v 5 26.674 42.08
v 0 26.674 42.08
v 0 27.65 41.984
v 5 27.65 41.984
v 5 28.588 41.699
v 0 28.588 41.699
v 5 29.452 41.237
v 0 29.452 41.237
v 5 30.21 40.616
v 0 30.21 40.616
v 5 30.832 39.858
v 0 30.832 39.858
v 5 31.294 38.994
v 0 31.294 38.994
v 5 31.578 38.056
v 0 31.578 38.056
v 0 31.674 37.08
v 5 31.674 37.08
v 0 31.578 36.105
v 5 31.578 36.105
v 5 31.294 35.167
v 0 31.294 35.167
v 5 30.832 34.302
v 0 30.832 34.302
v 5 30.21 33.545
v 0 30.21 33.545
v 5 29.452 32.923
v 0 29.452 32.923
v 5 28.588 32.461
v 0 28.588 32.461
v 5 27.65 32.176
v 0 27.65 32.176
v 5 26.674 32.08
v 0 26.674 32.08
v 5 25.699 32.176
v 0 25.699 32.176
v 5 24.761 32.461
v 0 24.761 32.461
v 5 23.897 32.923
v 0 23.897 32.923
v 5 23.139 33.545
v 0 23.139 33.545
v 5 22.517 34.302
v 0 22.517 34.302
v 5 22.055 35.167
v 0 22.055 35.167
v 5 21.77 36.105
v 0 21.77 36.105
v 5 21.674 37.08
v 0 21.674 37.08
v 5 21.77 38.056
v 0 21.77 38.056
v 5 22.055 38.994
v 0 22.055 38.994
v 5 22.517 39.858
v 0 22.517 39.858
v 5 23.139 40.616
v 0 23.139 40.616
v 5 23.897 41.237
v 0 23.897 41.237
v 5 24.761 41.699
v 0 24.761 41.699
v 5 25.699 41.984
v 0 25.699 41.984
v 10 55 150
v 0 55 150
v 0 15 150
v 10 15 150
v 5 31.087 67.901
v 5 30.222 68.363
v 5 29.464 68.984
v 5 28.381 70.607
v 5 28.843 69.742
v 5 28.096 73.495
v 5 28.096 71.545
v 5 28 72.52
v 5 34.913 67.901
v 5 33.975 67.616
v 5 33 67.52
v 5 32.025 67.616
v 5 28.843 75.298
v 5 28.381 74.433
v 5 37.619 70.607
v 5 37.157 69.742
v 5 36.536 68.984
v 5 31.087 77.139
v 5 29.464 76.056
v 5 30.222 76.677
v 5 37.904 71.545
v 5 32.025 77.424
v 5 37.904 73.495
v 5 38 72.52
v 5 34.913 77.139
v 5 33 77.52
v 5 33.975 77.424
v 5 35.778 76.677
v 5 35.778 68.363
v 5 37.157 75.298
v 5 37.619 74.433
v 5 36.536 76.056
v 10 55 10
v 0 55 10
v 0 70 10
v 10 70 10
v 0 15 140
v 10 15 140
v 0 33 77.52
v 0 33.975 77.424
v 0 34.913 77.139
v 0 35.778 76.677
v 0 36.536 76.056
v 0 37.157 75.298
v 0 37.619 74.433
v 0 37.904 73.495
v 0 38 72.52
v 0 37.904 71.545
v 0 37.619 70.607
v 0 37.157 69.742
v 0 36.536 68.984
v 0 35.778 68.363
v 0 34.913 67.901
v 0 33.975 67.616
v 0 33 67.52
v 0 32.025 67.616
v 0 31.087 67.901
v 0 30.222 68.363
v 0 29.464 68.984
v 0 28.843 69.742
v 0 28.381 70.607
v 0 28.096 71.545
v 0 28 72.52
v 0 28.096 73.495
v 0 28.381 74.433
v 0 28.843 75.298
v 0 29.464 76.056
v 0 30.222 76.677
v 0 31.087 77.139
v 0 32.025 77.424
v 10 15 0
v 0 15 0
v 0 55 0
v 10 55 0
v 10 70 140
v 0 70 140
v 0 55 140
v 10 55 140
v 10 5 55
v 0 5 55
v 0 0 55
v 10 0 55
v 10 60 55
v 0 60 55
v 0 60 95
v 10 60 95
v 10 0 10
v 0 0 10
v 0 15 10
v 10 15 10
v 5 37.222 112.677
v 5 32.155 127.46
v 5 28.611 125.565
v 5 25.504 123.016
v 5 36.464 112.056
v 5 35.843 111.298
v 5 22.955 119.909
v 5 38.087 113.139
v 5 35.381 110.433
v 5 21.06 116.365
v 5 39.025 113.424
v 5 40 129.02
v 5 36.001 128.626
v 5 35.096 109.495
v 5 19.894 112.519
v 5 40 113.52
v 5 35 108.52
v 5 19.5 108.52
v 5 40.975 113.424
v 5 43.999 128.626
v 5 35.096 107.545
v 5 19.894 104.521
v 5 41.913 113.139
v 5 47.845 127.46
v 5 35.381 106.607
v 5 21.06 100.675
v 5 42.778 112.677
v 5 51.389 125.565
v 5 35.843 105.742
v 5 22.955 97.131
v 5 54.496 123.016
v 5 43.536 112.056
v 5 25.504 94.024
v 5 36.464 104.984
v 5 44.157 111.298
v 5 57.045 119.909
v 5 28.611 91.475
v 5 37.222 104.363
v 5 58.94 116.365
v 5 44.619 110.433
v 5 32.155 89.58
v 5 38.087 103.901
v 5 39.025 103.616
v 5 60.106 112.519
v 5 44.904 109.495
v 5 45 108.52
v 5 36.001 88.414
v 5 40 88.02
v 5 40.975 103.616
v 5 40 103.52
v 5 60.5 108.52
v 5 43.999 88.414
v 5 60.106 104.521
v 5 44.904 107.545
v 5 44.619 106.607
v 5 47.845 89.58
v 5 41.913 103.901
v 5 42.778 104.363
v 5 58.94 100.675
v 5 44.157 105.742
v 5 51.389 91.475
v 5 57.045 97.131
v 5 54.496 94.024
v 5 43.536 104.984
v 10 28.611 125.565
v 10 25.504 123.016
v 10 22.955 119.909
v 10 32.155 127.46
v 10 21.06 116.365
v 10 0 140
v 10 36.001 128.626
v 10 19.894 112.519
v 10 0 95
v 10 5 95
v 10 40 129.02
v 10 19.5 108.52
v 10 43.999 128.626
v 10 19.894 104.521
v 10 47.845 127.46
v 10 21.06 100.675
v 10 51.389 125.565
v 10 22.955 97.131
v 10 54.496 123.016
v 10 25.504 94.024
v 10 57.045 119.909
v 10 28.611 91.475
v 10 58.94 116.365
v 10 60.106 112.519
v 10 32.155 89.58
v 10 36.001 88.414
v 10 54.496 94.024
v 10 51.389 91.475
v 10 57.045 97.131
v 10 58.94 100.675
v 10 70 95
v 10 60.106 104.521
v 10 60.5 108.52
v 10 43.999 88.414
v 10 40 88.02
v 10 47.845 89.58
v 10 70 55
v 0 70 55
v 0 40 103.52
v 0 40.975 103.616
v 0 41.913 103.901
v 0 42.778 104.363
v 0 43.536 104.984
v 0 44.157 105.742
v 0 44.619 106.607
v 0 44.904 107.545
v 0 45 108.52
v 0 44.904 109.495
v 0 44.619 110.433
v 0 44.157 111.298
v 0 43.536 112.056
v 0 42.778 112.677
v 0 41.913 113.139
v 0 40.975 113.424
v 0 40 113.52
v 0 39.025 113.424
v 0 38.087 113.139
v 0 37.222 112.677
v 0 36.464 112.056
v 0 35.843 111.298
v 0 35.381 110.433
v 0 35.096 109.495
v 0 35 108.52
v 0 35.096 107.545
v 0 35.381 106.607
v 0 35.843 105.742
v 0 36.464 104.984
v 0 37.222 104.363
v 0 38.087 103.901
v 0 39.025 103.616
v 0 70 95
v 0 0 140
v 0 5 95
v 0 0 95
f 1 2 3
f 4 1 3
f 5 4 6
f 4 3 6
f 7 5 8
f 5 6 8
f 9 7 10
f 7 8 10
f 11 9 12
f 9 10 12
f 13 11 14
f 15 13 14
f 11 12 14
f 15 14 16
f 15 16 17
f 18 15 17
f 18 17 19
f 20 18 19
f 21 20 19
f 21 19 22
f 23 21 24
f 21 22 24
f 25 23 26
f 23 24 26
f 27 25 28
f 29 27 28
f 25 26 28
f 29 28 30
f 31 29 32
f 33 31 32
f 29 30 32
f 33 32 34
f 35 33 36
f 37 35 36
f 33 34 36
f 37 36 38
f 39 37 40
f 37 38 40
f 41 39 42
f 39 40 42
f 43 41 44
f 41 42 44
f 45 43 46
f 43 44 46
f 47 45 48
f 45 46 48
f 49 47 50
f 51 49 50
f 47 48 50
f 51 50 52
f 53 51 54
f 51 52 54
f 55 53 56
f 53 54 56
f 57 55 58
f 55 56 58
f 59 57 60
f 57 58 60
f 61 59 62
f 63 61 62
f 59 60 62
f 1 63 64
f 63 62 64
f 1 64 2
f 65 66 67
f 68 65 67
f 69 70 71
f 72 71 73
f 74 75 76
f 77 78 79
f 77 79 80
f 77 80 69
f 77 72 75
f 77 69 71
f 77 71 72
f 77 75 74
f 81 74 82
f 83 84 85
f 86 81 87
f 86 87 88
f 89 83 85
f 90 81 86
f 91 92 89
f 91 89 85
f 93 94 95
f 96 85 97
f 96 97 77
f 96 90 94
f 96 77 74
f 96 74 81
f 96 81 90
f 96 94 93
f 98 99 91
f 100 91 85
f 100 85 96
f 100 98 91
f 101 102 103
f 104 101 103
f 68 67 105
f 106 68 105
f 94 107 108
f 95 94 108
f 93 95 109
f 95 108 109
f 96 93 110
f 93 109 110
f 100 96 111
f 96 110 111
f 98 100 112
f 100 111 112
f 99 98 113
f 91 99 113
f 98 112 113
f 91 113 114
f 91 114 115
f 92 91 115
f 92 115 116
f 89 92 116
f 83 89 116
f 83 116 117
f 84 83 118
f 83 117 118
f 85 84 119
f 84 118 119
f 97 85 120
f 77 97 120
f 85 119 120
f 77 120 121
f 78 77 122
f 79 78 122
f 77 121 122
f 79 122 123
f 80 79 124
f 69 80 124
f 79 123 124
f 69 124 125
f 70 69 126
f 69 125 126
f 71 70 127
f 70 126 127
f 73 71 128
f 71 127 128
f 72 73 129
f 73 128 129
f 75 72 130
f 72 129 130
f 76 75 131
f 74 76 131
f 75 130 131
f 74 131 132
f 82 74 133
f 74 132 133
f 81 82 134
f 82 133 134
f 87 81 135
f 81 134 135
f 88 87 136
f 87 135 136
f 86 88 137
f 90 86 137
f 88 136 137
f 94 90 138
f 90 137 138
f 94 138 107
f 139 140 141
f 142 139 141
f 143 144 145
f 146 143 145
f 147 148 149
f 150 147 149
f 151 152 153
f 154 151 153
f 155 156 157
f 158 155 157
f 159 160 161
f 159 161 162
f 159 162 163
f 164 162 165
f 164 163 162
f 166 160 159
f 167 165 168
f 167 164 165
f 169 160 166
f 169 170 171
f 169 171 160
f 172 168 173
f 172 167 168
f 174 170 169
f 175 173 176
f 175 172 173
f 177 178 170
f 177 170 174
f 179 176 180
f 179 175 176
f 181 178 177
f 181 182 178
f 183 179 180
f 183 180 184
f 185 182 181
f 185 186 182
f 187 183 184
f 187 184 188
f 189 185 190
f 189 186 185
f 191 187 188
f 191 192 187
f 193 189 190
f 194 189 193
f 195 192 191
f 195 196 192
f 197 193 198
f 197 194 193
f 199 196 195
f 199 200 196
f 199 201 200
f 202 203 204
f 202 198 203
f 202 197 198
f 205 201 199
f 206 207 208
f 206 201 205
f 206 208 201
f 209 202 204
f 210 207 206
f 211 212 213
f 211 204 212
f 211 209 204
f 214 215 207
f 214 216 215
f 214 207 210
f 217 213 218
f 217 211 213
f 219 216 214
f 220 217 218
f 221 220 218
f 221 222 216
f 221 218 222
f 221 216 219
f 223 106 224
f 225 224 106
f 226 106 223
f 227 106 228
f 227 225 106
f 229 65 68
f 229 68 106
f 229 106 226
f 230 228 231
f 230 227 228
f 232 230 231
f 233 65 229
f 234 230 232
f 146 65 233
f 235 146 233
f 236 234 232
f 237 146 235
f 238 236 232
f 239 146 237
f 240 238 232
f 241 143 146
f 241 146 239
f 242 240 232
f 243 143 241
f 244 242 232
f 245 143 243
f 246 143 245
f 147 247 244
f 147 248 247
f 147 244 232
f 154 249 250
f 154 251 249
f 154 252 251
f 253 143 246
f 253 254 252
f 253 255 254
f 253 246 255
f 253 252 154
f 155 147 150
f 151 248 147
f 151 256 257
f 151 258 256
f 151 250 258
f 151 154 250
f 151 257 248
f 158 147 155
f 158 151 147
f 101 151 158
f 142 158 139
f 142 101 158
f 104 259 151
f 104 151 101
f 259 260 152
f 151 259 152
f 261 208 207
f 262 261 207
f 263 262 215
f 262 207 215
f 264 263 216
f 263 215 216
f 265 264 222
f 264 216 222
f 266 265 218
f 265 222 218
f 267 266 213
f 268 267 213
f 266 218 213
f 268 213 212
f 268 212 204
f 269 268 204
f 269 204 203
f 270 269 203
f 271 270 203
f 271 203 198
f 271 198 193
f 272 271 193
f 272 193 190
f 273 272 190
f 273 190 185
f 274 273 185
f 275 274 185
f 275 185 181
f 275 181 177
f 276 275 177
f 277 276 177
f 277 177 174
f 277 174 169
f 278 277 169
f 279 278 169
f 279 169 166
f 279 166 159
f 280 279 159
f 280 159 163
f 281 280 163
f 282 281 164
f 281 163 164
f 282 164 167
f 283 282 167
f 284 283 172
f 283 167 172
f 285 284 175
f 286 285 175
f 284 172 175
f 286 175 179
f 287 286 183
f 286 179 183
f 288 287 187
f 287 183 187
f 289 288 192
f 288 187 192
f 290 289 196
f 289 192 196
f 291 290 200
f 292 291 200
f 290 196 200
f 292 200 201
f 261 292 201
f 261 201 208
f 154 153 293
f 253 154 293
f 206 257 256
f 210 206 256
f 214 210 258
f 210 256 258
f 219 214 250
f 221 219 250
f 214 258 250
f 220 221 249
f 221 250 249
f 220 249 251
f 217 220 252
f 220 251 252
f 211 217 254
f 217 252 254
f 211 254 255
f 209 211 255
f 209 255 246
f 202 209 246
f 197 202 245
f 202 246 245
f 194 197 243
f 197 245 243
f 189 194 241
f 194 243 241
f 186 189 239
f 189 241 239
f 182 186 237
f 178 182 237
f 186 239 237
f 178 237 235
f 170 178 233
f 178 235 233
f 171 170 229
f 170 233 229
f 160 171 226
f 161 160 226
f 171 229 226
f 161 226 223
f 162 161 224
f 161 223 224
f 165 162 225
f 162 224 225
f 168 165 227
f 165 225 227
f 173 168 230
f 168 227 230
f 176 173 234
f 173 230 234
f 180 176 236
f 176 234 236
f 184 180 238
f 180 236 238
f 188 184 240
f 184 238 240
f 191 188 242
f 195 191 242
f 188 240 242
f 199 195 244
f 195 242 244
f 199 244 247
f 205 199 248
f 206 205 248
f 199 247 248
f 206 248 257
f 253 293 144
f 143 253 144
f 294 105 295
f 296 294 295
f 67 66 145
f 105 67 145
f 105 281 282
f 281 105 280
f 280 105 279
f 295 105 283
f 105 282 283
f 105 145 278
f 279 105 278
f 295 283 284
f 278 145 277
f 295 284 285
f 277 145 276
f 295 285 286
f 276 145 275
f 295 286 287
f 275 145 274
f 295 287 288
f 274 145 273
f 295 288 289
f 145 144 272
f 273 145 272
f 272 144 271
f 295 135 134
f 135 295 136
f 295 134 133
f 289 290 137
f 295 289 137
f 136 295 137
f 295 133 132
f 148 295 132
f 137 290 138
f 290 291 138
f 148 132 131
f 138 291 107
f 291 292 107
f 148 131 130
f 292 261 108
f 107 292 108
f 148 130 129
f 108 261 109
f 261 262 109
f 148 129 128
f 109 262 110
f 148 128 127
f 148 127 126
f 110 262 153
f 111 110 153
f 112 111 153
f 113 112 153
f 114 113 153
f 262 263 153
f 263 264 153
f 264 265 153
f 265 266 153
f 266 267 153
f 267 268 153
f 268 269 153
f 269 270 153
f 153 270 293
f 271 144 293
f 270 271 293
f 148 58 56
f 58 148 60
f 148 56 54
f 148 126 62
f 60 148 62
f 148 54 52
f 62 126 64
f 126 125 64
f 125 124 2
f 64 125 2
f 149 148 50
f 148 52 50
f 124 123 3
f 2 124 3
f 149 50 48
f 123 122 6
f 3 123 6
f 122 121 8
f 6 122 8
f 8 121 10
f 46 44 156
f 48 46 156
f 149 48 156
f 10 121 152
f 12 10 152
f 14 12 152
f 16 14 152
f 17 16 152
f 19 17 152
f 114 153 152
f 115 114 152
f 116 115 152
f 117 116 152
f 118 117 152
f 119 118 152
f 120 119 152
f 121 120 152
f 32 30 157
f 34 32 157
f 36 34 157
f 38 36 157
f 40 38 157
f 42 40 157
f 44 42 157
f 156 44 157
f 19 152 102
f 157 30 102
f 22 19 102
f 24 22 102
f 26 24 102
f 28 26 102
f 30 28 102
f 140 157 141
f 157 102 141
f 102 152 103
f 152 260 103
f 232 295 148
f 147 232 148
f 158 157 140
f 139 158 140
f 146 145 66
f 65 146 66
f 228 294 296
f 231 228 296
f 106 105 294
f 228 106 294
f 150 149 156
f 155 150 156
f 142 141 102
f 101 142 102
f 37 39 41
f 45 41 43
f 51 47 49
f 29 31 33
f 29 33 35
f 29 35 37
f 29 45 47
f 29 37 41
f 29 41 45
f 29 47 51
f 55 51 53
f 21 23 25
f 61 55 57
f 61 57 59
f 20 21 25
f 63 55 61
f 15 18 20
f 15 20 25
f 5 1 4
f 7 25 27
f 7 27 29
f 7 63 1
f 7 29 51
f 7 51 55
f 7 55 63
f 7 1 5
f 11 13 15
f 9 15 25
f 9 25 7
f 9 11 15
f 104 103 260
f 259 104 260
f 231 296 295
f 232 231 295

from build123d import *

# Parameters (mm, degrees)
BOSS_EXTRUDE1_DEPTH = 10
SKETCH2_R           = 20.5
CUT_EXTRUDE1_DEPTH  = 5
SKETCH4_R           = 5
CUT_EXTRUDE3_DEPTH  = 166.604951617
SKETCH5_R           = 5
CUT_EXTRUDE4_DEPTH  = 5


with BuildPart() as part:
    # Sketch1 → Boss-Extrude1 (new body)
    with BuildSketch(Plane(origin=(0, 0, 0), x_dir=(0, 0, -1), z_dir=(1, 0, 0))):
        Polygon((-95, 70), (-140, 70), (-140, 55), (-150, 55), (-150, 15), (-140, 15), (-140, 0), (-95, 0), (-95, 5), (-55, 5), (-55, 0), (-10, 0), (-10, 15), (0, 15), (0, 55), (-10, 55), (-10, 70), (-55, 70), (-55, 60), (-95, 60), align=None)
    extrude(amount=BOSS_EXTRUDE1_DEPTH)

    # Sketch2 → Cut-Extrude1 (cut)
    with BuildSketch(Plane(origin=(10, 0, 0), x_dir=(0, 0, -1), z_dir=(1, 0, 0))):
        with Locations((-108.52, 40)):
            Circle(SKETCH2_R)
    extrude(amount=-CUT_EXTRUDE1_DEPTH, mode=Mode.SUBTRACT)

    # Sketch4 → Cut-Extrude3 (cut, through all)
    with BuildSketch(Plane(origin=(5, 0, 0), x_dir=(0, 0, -1), z_dir=(1, 0, 0))):
        with Locations((-108.52, 40)):
            Circle(SKETCH4_R)
    extrude(amount=-CUT_EXTRUDE3_DEPTH, mode=Mode.SUBTRACT)

    # Sketch5 → Cut-Extrude4 (cut)
    with BuildSketch(Plane.ZY):
        with Locations((37.080096083, 26.674400393)):
            Circle(SKETCH5_R)
        with Locations((72.52, 33)):
            Circle(SKETCH5_R)
    extrude(amount=-CUT_EXTRUDE4_DEPTH, mode=Mode.SUBTRACT)


solid = part.part
